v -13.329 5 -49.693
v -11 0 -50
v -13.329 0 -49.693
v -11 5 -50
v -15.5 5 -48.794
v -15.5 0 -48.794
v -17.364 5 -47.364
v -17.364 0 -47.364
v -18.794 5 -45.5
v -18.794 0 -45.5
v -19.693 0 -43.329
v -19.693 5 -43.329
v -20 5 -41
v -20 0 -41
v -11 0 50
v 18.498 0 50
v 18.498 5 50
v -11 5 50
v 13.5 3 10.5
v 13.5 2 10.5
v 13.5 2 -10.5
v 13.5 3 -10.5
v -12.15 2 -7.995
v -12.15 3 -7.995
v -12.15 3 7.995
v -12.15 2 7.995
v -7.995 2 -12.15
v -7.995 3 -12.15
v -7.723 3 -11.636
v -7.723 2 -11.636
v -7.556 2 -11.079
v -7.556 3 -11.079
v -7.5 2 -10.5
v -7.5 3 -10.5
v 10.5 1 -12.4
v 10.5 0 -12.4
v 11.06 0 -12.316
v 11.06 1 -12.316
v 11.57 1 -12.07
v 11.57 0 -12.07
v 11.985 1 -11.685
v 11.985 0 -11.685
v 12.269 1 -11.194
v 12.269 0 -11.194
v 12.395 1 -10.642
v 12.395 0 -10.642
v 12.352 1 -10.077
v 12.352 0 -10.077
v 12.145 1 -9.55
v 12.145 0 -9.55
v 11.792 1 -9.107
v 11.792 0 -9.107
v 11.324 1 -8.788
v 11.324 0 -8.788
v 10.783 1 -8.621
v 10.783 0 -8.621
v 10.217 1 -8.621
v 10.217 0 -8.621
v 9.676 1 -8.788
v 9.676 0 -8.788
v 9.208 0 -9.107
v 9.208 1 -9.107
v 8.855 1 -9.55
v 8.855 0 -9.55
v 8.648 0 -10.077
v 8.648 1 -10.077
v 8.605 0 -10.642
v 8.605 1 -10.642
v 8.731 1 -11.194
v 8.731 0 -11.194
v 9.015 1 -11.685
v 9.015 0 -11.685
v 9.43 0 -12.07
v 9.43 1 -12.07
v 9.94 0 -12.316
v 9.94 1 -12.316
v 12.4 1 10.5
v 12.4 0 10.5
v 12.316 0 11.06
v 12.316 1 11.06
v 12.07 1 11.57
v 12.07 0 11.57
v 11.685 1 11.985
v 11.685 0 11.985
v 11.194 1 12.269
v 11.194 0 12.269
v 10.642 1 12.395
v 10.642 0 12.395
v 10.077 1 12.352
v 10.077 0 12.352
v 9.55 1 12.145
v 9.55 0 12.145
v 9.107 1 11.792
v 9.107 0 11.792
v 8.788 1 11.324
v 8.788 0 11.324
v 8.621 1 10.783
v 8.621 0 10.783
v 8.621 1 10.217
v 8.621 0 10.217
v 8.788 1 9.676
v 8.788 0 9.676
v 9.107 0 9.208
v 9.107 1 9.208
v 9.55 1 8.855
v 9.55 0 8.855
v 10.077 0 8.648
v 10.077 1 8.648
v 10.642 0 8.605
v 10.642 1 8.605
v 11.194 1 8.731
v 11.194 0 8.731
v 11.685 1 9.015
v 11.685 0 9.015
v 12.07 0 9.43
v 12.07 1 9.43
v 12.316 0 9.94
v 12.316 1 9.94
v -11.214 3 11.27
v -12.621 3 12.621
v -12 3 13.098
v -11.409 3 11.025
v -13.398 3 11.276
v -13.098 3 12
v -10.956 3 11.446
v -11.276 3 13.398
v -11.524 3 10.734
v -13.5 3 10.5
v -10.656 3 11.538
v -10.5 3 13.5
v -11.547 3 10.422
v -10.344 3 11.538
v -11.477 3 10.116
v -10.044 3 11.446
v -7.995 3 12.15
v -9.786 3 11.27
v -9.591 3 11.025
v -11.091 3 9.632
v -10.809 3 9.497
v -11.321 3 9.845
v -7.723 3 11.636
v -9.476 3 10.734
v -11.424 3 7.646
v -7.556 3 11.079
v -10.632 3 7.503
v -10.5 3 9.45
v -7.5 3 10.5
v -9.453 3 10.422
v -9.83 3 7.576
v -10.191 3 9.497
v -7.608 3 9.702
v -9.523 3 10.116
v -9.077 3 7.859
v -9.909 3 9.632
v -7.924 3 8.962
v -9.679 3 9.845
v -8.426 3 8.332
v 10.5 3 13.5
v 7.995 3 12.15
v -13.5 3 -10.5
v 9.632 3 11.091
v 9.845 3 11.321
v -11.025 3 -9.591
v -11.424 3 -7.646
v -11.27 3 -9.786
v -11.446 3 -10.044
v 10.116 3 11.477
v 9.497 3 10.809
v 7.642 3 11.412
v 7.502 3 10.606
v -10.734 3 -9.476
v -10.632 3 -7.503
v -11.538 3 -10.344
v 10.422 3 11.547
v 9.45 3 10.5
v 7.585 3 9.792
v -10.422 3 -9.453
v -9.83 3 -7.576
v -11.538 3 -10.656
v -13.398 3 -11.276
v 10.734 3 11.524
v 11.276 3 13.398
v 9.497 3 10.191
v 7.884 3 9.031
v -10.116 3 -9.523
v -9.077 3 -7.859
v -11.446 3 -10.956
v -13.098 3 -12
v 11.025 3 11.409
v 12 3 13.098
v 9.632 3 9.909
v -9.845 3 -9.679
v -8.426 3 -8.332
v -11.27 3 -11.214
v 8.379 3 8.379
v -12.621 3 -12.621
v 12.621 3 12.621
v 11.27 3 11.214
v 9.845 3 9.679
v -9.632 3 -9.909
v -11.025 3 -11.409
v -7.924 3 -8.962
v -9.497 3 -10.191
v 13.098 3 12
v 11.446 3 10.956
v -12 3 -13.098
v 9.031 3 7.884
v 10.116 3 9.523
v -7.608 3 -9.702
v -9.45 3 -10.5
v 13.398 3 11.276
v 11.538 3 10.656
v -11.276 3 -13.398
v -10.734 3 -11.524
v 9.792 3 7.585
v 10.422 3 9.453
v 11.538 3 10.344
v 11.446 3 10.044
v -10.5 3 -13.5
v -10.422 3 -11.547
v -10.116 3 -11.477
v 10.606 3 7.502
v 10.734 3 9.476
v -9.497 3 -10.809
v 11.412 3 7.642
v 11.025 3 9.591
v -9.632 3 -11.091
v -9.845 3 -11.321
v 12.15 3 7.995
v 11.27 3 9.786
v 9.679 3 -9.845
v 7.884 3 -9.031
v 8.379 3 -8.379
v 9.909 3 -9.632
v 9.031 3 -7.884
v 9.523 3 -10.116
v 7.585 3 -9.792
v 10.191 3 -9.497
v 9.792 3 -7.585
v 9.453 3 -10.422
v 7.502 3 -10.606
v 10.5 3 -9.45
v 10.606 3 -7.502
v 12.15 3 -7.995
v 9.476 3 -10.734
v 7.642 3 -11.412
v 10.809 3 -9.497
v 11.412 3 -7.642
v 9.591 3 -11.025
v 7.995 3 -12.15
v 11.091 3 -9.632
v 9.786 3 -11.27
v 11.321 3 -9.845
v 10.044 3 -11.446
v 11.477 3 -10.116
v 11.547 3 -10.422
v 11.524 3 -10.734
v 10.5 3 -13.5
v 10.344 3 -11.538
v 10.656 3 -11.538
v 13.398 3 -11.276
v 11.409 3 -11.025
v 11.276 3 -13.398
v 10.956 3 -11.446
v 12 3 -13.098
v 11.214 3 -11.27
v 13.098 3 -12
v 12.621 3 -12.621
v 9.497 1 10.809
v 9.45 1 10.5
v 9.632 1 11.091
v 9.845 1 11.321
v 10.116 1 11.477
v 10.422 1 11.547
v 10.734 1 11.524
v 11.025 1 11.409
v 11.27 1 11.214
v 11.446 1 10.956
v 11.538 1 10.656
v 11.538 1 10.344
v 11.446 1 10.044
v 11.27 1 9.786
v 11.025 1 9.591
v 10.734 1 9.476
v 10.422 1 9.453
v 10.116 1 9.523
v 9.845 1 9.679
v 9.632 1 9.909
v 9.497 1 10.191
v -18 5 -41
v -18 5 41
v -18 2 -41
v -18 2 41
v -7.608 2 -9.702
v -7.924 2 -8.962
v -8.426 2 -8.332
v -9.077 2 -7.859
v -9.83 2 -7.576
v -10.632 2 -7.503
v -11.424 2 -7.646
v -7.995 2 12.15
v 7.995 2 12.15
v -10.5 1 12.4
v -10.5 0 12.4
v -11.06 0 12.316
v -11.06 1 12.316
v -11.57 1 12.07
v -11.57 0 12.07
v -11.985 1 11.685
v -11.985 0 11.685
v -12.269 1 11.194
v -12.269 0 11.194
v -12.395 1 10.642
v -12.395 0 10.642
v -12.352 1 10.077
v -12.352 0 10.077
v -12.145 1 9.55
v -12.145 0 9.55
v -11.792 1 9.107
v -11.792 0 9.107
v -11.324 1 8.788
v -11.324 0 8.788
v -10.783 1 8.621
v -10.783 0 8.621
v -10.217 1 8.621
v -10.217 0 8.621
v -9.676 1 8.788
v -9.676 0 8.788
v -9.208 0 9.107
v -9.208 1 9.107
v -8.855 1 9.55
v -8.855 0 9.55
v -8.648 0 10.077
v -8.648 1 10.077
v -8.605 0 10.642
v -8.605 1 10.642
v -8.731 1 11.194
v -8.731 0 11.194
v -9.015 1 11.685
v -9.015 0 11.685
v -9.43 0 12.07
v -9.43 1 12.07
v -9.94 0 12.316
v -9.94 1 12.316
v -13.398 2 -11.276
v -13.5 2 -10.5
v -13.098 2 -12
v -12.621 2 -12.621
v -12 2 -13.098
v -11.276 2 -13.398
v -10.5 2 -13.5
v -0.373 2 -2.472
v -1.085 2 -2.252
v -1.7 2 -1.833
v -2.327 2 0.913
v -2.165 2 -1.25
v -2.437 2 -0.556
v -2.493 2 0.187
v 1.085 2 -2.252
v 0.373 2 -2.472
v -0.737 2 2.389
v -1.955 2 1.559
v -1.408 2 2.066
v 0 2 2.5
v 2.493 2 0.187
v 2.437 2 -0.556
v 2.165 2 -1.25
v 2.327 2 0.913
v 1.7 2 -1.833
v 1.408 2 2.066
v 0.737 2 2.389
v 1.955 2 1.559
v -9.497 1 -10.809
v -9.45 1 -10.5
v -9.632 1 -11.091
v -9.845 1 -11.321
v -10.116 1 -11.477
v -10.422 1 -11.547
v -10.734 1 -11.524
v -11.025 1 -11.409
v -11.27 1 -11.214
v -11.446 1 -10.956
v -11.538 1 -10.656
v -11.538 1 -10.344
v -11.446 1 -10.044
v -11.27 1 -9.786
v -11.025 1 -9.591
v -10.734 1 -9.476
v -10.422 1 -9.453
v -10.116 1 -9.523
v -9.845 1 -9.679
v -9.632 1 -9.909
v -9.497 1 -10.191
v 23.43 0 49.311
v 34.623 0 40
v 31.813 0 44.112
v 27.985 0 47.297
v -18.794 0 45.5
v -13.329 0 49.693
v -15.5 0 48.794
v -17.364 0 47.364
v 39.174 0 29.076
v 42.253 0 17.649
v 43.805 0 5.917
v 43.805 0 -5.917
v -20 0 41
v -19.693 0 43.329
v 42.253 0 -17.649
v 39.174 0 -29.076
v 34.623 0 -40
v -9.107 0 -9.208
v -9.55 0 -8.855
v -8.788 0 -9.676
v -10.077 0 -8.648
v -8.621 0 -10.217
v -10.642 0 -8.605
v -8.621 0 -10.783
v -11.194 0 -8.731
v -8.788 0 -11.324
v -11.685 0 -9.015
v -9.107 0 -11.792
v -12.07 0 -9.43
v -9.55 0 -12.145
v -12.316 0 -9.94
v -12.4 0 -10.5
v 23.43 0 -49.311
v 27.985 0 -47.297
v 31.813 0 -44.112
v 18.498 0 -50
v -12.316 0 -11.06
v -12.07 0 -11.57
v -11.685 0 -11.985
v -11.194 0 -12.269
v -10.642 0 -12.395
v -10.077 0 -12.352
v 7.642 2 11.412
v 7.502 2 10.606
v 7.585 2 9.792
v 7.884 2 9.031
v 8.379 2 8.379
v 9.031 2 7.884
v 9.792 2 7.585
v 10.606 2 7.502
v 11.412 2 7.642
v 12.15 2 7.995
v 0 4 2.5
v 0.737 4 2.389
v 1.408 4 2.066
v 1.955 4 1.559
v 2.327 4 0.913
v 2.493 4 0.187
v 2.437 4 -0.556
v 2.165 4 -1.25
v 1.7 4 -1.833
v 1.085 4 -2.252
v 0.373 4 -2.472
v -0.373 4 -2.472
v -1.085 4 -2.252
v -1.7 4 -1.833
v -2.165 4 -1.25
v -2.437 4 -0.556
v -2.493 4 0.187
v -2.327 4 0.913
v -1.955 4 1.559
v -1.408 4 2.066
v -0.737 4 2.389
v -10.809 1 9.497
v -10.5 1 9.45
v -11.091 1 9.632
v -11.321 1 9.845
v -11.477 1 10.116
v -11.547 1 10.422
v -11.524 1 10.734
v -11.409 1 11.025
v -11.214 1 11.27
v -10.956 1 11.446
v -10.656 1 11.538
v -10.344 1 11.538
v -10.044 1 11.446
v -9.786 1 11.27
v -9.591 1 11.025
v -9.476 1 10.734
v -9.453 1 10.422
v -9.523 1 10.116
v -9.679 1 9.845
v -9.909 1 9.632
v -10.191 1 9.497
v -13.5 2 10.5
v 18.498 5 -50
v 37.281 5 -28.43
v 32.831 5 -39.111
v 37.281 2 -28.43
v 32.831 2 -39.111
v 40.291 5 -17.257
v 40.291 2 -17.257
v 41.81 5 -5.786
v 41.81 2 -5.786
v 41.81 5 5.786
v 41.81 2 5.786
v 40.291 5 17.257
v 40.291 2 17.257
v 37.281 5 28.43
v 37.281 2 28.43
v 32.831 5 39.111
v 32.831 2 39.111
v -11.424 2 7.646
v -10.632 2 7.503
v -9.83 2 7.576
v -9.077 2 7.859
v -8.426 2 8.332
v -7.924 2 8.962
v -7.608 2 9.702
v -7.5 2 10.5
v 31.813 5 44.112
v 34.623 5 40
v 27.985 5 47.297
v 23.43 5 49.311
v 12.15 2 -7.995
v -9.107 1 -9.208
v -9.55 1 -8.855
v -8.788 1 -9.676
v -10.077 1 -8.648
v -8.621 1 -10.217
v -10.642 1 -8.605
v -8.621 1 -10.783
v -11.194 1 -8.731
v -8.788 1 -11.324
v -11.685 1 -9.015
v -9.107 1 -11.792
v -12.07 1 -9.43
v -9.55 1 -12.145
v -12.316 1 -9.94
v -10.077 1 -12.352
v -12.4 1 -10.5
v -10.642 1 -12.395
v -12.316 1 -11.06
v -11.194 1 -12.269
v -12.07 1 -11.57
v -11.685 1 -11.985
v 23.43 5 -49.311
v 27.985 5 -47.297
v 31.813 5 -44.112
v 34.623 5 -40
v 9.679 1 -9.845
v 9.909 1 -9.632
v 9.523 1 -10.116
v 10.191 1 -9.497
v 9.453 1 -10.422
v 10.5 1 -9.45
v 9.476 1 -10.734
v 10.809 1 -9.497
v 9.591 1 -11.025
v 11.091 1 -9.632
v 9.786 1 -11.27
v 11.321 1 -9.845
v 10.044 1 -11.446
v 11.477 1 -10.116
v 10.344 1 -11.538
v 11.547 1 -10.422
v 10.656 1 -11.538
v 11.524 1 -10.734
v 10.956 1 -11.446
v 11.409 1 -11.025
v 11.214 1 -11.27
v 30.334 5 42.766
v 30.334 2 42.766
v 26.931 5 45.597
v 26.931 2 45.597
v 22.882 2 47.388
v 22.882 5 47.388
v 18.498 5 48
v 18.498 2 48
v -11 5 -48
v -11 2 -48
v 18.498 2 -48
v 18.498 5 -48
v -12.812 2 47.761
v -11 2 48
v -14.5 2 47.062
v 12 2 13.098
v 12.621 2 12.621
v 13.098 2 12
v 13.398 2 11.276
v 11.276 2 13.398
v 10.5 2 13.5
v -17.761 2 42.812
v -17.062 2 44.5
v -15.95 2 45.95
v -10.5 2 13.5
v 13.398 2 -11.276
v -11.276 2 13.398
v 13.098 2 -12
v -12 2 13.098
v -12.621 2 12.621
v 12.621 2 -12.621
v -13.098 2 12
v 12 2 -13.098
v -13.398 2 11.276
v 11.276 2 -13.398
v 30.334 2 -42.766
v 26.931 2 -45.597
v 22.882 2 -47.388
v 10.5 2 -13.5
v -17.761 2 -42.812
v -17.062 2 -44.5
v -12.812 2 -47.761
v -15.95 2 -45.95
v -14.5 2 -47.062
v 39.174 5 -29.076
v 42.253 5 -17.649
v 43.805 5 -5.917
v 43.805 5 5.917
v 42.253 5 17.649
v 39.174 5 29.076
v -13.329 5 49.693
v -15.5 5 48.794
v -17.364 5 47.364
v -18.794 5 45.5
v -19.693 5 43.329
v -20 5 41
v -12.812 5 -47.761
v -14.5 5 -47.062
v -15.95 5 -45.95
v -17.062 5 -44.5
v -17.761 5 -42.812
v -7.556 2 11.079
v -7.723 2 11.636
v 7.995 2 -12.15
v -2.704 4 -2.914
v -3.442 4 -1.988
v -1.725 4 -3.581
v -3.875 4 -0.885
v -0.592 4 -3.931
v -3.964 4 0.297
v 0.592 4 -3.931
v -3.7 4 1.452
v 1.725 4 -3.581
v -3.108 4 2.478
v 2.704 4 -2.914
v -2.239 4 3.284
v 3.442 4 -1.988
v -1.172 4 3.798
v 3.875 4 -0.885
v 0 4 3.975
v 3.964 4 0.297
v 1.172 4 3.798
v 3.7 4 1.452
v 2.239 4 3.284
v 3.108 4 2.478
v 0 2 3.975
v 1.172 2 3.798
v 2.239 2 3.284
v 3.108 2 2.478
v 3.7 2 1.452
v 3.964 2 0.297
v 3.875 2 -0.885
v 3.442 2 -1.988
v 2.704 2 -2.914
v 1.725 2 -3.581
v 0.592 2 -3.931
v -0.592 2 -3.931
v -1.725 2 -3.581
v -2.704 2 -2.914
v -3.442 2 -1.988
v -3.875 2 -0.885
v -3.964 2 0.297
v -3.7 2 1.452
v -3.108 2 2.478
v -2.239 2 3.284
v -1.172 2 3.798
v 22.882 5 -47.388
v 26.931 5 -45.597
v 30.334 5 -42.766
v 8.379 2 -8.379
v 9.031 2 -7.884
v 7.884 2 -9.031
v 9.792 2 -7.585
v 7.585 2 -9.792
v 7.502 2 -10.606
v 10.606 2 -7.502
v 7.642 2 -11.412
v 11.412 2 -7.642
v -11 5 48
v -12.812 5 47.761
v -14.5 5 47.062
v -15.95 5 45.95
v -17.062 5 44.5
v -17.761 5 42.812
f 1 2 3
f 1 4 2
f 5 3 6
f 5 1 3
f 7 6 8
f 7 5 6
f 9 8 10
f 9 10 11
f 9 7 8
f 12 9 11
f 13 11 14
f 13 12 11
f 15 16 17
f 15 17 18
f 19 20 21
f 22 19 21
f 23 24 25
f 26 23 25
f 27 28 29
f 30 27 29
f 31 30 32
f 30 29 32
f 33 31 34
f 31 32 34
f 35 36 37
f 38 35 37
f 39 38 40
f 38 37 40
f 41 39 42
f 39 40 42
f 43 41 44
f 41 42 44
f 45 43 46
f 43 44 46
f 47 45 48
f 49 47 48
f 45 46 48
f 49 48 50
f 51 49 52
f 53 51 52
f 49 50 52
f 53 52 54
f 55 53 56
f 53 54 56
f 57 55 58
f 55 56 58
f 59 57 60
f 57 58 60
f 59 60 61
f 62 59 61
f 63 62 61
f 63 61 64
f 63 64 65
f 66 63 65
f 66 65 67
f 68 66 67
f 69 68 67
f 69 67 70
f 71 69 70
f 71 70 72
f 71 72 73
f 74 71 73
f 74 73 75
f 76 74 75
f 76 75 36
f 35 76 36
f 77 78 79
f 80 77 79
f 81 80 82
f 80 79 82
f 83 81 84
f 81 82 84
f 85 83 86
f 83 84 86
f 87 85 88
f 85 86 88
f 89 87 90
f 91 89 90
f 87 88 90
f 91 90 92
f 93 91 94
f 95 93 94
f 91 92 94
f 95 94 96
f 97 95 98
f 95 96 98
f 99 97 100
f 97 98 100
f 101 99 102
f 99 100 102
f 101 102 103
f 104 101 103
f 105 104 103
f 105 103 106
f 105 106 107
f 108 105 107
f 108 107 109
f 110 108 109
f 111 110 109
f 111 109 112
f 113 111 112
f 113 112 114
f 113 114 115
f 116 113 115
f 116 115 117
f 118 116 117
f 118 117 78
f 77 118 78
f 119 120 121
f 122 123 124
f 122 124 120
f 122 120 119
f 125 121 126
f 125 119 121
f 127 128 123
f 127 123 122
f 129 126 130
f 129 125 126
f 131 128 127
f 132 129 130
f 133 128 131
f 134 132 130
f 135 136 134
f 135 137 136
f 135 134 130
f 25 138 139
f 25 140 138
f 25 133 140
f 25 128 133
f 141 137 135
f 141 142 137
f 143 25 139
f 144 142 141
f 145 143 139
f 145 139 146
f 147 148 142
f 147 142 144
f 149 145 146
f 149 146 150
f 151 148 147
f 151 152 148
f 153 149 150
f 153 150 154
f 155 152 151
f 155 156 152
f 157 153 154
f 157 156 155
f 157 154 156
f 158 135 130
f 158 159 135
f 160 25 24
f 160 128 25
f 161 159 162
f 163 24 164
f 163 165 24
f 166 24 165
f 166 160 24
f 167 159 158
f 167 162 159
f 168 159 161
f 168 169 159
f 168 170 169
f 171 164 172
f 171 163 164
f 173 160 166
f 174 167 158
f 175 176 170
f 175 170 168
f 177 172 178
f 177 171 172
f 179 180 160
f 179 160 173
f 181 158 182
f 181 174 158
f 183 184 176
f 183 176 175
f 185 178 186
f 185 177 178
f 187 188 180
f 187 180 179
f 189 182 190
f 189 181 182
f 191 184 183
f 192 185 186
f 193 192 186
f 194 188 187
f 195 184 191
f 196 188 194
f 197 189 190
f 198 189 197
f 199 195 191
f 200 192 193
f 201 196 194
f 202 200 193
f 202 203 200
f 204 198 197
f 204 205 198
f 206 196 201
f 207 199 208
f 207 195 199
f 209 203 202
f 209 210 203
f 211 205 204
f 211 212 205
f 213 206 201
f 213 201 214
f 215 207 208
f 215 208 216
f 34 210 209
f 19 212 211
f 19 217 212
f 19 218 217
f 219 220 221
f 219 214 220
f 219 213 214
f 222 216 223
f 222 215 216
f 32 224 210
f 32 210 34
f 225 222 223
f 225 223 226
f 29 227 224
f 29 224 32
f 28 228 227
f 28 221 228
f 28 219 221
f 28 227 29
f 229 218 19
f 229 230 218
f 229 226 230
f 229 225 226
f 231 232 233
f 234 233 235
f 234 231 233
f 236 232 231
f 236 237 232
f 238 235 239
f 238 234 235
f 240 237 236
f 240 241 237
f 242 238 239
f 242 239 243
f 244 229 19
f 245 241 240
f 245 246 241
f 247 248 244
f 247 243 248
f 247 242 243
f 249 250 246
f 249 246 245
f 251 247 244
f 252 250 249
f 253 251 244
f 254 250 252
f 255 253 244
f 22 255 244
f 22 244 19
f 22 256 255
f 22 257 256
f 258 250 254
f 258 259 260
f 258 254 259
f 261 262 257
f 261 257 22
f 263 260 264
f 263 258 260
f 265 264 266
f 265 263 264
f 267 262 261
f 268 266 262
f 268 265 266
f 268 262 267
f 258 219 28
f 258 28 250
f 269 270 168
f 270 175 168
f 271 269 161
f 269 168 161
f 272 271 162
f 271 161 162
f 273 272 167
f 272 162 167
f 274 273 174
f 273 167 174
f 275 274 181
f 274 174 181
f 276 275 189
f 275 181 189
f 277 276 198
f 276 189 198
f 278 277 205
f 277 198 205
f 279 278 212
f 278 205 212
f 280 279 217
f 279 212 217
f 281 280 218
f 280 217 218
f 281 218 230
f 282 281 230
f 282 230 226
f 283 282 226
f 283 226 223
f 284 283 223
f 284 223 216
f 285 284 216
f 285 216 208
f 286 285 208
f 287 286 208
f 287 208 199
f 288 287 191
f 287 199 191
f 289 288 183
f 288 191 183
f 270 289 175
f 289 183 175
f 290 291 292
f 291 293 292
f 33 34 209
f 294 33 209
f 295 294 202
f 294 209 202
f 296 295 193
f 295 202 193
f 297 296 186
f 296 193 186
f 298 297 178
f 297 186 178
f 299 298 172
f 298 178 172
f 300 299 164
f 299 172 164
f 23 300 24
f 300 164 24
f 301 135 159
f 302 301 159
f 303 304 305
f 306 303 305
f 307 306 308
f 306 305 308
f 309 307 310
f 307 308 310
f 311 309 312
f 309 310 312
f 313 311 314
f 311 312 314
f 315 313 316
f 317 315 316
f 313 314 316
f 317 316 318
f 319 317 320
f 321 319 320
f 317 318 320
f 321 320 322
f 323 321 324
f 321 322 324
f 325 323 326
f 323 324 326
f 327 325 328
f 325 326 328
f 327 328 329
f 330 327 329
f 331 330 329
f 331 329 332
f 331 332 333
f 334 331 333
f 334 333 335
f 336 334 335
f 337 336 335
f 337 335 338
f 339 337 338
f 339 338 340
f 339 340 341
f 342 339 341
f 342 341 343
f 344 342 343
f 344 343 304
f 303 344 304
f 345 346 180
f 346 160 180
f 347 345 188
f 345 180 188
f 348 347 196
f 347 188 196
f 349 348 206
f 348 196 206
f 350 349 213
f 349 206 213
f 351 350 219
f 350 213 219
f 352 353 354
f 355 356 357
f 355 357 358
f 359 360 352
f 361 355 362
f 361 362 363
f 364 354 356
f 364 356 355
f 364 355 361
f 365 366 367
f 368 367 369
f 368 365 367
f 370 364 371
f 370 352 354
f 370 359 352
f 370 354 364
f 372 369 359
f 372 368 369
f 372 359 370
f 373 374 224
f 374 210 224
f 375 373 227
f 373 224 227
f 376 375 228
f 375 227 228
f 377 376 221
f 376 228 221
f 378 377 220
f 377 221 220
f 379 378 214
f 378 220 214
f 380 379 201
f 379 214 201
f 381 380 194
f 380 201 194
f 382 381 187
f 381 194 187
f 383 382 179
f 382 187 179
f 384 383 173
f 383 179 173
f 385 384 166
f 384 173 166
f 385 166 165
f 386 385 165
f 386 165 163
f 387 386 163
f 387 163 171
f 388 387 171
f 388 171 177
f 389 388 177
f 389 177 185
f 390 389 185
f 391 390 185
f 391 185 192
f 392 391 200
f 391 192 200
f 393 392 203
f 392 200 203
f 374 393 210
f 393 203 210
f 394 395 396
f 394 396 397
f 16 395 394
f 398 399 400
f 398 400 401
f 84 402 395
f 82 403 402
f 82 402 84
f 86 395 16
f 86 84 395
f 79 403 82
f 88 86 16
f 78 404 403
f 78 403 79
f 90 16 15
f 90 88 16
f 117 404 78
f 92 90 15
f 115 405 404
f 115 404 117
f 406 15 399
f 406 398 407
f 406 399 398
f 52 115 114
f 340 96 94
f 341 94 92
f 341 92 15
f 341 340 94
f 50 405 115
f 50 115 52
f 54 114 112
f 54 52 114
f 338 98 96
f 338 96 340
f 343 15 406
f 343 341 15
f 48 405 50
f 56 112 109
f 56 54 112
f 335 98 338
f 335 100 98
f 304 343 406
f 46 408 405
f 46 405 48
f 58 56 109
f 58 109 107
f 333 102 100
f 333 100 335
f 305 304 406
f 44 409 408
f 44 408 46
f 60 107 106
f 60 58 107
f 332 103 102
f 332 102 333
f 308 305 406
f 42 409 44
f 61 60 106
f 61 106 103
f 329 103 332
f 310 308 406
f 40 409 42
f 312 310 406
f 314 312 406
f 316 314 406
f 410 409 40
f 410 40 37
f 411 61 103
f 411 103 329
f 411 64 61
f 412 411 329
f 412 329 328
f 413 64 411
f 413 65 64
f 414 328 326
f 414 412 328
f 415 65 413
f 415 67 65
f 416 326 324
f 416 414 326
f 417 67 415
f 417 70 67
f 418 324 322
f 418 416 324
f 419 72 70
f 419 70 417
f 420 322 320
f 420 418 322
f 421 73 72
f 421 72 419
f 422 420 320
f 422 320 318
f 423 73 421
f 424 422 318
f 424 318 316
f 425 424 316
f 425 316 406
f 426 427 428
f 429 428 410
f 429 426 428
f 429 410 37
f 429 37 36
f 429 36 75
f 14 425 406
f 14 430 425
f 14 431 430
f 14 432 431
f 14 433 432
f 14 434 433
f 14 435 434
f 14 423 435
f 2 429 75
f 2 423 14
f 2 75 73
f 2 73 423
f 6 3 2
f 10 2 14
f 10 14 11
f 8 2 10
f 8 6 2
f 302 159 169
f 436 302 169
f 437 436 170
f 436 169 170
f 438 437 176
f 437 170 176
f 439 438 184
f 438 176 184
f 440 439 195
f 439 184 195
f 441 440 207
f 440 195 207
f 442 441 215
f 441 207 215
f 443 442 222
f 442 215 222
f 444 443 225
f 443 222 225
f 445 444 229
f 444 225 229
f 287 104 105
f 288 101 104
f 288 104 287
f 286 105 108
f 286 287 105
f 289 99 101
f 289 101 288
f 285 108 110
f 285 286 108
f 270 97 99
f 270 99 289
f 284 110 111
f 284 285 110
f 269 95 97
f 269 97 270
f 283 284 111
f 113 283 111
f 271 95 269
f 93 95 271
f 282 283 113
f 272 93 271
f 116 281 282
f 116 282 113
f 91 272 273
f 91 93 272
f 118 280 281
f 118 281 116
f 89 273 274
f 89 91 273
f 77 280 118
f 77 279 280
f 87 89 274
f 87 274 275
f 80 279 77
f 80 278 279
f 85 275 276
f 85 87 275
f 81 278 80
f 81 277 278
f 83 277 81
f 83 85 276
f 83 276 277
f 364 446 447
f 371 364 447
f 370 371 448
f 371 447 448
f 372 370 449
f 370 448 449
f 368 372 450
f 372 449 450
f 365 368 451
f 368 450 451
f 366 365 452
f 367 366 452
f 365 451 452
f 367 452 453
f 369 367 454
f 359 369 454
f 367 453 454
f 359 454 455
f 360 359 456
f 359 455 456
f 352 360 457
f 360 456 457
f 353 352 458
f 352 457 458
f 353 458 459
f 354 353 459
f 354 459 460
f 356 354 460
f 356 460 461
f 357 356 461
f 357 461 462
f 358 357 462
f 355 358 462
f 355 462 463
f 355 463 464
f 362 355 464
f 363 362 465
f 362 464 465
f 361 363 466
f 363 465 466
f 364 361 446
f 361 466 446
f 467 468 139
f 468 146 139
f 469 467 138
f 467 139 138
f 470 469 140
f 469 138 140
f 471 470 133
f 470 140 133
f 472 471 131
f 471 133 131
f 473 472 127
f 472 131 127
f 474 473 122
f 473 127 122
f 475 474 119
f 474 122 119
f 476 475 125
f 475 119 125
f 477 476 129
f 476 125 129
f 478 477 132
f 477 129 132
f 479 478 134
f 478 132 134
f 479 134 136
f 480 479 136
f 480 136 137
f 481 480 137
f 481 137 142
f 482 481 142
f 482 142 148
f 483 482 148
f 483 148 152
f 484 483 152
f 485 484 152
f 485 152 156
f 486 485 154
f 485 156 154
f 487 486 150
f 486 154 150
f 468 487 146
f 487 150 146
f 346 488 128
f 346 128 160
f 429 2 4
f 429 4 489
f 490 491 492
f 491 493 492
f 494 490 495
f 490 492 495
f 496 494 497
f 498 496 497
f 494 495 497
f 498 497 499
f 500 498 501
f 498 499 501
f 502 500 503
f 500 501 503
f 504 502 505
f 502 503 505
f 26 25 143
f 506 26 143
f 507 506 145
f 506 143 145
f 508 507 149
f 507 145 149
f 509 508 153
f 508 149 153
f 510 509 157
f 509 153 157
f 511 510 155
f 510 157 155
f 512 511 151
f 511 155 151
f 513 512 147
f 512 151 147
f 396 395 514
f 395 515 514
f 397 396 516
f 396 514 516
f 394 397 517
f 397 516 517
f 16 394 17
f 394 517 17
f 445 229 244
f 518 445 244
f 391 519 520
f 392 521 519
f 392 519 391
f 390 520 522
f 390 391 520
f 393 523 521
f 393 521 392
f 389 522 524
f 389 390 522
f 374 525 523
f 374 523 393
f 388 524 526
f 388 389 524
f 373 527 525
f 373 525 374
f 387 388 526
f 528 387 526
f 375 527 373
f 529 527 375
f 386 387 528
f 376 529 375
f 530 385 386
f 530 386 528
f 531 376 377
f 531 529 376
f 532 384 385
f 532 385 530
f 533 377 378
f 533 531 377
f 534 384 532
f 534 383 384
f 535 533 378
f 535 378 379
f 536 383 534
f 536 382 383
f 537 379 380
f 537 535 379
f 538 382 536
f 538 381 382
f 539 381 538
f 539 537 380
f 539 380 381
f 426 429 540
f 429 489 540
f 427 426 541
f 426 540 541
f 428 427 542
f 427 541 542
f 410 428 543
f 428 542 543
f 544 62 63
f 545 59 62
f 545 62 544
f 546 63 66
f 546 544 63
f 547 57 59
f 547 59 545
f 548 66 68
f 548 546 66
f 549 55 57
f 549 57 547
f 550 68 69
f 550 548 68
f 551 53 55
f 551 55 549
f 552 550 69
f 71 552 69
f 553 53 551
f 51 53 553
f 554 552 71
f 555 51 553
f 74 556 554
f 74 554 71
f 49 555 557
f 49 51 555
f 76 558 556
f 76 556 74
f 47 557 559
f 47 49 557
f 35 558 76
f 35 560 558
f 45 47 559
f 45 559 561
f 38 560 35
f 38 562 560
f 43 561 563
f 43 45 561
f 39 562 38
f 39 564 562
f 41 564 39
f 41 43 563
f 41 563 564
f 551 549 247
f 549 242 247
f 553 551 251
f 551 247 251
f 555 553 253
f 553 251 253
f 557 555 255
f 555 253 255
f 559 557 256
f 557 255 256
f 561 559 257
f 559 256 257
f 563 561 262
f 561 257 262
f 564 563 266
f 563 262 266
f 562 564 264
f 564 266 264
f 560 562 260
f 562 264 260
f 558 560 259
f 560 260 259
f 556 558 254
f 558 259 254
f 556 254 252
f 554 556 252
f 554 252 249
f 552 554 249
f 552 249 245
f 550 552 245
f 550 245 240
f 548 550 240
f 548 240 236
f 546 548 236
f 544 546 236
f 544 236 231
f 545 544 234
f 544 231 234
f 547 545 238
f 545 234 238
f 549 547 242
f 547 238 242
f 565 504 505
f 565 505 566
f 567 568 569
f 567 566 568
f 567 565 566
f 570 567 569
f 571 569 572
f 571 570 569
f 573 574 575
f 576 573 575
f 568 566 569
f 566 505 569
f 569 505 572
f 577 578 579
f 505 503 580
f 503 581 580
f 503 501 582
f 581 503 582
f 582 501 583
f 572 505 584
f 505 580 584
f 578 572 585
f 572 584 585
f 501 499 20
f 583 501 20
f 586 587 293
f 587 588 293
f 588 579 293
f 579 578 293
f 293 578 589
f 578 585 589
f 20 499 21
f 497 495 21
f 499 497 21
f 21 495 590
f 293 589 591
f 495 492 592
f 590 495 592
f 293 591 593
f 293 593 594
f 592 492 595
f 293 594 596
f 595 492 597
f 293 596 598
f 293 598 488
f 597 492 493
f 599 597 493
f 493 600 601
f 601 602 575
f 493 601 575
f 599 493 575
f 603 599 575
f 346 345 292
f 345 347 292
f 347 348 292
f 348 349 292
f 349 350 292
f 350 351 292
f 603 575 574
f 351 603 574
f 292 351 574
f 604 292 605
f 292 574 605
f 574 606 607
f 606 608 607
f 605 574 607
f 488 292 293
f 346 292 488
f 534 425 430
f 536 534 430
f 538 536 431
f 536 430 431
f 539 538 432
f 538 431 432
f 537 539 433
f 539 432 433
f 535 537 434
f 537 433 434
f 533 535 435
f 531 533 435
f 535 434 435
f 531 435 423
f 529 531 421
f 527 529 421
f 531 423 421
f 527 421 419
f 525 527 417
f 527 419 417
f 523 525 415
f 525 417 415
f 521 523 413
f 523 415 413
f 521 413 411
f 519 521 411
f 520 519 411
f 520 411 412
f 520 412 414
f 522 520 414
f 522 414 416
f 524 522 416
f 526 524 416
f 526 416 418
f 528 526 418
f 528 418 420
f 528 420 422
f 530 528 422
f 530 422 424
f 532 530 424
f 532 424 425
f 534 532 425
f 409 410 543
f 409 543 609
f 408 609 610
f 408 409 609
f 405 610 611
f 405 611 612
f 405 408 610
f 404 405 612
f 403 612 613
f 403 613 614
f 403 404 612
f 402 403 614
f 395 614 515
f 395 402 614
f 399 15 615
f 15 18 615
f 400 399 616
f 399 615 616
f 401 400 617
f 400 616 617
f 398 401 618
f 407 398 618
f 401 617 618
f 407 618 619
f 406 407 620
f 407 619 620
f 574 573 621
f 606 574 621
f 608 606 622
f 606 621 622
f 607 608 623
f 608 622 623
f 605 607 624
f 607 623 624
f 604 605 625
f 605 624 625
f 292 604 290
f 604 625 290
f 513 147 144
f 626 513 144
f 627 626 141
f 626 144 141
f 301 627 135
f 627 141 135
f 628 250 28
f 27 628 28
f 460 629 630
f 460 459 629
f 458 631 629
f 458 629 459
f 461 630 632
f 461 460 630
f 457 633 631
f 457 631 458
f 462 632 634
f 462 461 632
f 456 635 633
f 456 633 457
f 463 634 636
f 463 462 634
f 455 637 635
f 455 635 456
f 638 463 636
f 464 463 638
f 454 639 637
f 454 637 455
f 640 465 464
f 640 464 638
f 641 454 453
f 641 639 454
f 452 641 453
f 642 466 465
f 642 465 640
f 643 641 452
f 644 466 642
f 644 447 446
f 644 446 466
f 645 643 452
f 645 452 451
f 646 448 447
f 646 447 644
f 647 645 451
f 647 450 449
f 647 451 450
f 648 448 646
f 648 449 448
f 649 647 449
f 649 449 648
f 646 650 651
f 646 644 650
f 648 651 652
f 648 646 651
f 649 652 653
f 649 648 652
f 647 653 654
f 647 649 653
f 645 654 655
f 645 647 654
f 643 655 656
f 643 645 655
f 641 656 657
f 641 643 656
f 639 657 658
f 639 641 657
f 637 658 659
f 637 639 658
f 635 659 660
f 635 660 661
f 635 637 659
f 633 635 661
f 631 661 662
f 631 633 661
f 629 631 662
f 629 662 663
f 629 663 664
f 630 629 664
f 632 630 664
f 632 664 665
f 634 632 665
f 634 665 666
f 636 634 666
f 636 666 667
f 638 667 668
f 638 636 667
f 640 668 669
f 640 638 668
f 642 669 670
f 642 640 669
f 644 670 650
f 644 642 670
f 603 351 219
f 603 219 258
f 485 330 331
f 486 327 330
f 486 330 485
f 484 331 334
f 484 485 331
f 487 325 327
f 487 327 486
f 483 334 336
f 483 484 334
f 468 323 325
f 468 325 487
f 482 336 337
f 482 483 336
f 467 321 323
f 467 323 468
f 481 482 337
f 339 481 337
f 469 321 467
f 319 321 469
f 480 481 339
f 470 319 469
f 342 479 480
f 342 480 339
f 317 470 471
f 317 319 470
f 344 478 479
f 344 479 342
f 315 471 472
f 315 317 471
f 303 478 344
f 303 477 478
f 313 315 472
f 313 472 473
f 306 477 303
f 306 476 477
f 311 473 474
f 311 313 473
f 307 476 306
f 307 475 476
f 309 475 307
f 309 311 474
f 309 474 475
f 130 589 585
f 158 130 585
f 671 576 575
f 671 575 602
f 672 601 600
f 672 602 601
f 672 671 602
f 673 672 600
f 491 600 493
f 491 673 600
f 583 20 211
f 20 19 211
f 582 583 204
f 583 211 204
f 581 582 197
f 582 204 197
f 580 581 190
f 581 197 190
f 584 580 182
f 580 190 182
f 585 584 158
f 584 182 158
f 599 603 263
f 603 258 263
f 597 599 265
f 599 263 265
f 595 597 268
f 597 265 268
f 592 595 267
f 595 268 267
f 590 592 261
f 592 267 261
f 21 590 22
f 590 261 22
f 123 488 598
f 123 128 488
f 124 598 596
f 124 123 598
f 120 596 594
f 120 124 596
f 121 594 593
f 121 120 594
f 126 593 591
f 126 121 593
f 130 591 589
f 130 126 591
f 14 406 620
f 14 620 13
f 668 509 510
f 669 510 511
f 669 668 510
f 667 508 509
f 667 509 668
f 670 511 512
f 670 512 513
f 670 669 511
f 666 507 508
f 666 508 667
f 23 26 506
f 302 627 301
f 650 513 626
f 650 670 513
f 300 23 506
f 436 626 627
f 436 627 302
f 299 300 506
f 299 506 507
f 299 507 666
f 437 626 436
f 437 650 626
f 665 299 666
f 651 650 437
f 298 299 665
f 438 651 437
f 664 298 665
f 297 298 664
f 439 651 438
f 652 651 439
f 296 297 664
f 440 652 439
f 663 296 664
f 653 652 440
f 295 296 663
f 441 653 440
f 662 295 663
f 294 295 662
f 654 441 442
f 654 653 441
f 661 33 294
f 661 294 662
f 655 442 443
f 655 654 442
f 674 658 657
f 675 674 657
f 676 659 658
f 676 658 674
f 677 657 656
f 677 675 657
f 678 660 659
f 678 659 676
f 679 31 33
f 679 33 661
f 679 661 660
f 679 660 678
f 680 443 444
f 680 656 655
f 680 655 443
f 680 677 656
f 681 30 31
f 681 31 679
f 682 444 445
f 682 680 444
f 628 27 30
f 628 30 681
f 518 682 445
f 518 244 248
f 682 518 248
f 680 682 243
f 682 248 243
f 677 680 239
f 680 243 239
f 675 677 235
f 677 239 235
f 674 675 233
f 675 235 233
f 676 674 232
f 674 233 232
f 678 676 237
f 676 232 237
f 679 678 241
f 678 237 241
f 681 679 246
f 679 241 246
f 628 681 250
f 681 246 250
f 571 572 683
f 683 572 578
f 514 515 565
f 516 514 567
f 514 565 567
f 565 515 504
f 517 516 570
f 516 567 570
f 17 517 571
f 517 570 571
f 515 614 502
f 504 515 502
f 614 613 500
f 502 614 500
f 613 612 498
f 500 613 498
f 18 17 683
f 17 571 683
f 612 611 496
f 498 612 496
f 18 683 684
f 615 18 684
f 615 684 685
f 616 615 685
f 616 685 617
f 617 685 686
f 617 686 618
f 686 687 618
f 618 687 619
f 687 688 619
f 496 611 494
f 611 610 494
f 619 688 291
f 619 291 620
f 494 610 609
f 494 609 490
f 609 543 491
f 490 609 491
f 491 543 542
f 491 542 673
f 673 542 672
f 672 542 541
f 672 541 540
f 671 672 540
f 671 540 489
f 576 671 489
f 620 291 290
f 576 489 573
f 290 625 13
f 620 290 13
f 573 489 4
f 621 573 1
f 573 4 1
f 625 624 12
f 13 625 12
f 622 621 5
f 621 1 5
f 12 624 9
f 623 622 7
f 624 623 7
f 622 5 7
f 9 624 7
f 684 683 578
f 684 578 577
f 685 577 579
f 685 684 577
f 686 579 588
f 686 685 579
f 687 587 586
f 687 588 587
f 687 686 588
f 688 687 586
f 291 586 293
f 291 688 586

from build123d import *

# Parameters (mm, degrees)
EXTRUDE_1_DEPTH              = 5
FILLET_1_R                   = 9
FILLET_2_R                   = 18
SHELL_1_T                    = -2
SKETCH_2_W                   = 27
SKETCH_2_H                   = 27
EXTRUDE_2_DEPTH              = 1
SKETCH_3_R                   = 3.975
EXTRUDE_3_DEPTH              = 1
FILLET_3_R                   = 3
HOLE_WIZARD_M2_1_D           = 2.1
HOLE_WIZARD_M2_1_CBORE_D     = 3.8
HOLE_WIZARD_M2_1_CBORE_DEPTH = 1
PATTERN_CIRCULAR_1_COUNT     = 4
SKETCH_6_R                   = 3.975
CUT_EXTRUDE_1_DEPTH          = 1
SKETCH_7_R                   = 2.5
CUT_EXTRUDE_2_DEPTH          = 2


with BuildPart() as part:
    # ｽｹｯﾁ1 → ﾎﾞｽ - 押し出し1 (new body)
    with BuildSketch(Plane(origin=(0, 0, 0), x_dir=(1, 0, 0), z_dir=(0, 1, 0))):
        with BuildLine():
            Line((-20, 50), (28.833147735, 50))
            ThreePointArc((28.833147735, 50), (44, 0), (28.833147735, -50))
            Line((28.833147735, -50), (-20, -50))
            Line((-20, -50), (-20, 50))
        make_face()
    extrude(amount=EXTRUDE_1_DEPTH)

    # ﾌｨﾚｯﾄ1
    fillet_1_edges = [part.edges().sort_by_distance(p)[0] for p in [
        (-20, 2.5, -50),
        (-20, 2.5, 50),
    ]]
    fillet(fillet_1_edges, radius=FILLET_1_R)

    # ﾌｨﾚｯﾄ2
    fillet_2_edges = [part.edges().sort_by_distance(p)[0] for p in [
        (28.833147735, 2.5, -50),
        (28.833147735, 2.5, 50),
    ]]
    fillet(fillet_2_edges, radius=FILLET_2_R)

    # ｼｪﾙ1
    shell_1_openings = [part.faces().sort_by_distance(p)[0] for p in [
        (9.782139289, 5, 0),
    ]]
    offset(amount=SHELL_1_T, openings=shell_1_openings, kind=Kind.INTERSECTION)

    # ｽｹｯﾁ2 → ﾎﾞｽ - 押し出し2 (add)
    with BuildSketch(Plane(origin=(0, 2, 0), x_dir=(1, 0, 0), z_dir=(0, 1, 0))):
        Rectangle(SKETCH_2_W, SKETCH_2_H)
    extrude(amount=EXTRUDE_2_DEPTH)

    # ｽｹｯﾁ3 → ﾎﾞｽ - 押し出し3 (add)
    with BuildSketch(Plane(origin=(0, 3, 0), x_dir=(1, 0, 0), z_dir=(0, 1, 0))):
        with Locations(Location((0, 0, 0), (0, 0, 270))):
            Circle(SKETCH_3_R)
    extrude(amount=EXTRUDE_3_DEPTH)

    # ﾌｨﾚｯﾄ3
    fillet_3_edges = [part.edges().sort_by_distance(p)[0] for p in [
        (13.5, 2.5, 13.5),
        (13.5, 2.5, -13.5),
        (-13.5, 2.5, -13.5),
        (-13.5, 2.5, 13.5),
    ]]
    fillet(fillet_3_edges, radius=FILLET_3_R)

    # M2 なべ頭ねじ用座ぐり穴1 (through all)
    with Locations(Plane(origin=(0, 0, 0), x_dir=(-1, 0, 0), z_dir=(0, -1, 0))):
        with Locations((10.5, 10.5)):
            hole_wizard_m2_1 = CounterBoreHole(HOLE_WIZARD_M2_1_D / 2, HOLE_WIZARD_M2_1_CBORE_D / 2, HOLE_WIZARD_M2_1_CBORE_DEPTH)

    # 円形ﾊﾟﾀｰﾝ1: M2 なべ頭ねじ用座ぐり穴1 ×4 about axis
    pattern_circular_1_axis = Axis((0, 0, 0), (0, 1, 0))
    for i in range(1, PATTERN_CIRCULAR_1_COUNT):
        add(hole_wizard_m2_1.rotate(pattern_circular_1_axis, i * 360 / PATTERN_CIRCULAR_1_COUNT), mode=Mode.SUBTRACT)

    # ｽｹｯﾁ6 → ｶｯﾄ - 押し出し1 (cut)
    with BuildSketch(Plane(origin=(0, 3, 0), x_dir=(1, 0, 0), z_dir=(0, 1, 0))):
        with BuildLine():
            Line((-7.994506037, -12.15), (7.994506037, -12.15))
            ThreePointArc((7.994506037, -12.15), (8.378679656, -8.378679656), (12.15, -7.994506037))
            Line((12.15, -7.994506037), (12.15, 7.994506037))
            ThreePointArc((12.15, 7.994506037), (8.378679656, 8.378679656), (7.994506037, 12.15))
            Line((7.994506037, 12.15), (-7.994506037, 12.15))
            ThreePointArc((-7.994506037, 12.15), (-7.62628447, 11.36125435), (-7.5, 10.5))
            ThreePointArc((-7.5, 10.5), (-9.076975053, 7.858977471), (-12.15, 7.994506037))
            Line((-12.15, 7.994506037), (-12.15, -7.994506037))
            ThreePointArc((-12.15, -7.994506037), (-9.076975053, -7.858977471), (-7.5, -10.5))
            ThreePointArc((-7.5, -10.5), (-7.62628447, -11.36125435), (-7.994506037, -12.15))
        make_face()
        with Locations(Location((0, 0, 0), (0, 0, 270))):
            Circle(SKETCH_6_R, mode=Mode.SUBTRACT)
    extrude(amount=-CUT_EXTRUDE_1_DEPTH, mode=Mode.SUBTRACT)

    # ｽｹｯﾁ7 → ｶｯﾄ - 押し出し2 (cut)
    with BuildSketch(Plane(origin=(0, 4, 0), x_dir=(1, 0, 0), z_dir=(0, 1, 0))):
        with Locations(Location((0, 0, 0), (0, 0, 270))):
            Circle(SKETCH_7_R)
    extrude(amount=-CUT_EXTRUDE_2_DEPTH, mode=Mode.SUBTRACT)


solid = part.part
